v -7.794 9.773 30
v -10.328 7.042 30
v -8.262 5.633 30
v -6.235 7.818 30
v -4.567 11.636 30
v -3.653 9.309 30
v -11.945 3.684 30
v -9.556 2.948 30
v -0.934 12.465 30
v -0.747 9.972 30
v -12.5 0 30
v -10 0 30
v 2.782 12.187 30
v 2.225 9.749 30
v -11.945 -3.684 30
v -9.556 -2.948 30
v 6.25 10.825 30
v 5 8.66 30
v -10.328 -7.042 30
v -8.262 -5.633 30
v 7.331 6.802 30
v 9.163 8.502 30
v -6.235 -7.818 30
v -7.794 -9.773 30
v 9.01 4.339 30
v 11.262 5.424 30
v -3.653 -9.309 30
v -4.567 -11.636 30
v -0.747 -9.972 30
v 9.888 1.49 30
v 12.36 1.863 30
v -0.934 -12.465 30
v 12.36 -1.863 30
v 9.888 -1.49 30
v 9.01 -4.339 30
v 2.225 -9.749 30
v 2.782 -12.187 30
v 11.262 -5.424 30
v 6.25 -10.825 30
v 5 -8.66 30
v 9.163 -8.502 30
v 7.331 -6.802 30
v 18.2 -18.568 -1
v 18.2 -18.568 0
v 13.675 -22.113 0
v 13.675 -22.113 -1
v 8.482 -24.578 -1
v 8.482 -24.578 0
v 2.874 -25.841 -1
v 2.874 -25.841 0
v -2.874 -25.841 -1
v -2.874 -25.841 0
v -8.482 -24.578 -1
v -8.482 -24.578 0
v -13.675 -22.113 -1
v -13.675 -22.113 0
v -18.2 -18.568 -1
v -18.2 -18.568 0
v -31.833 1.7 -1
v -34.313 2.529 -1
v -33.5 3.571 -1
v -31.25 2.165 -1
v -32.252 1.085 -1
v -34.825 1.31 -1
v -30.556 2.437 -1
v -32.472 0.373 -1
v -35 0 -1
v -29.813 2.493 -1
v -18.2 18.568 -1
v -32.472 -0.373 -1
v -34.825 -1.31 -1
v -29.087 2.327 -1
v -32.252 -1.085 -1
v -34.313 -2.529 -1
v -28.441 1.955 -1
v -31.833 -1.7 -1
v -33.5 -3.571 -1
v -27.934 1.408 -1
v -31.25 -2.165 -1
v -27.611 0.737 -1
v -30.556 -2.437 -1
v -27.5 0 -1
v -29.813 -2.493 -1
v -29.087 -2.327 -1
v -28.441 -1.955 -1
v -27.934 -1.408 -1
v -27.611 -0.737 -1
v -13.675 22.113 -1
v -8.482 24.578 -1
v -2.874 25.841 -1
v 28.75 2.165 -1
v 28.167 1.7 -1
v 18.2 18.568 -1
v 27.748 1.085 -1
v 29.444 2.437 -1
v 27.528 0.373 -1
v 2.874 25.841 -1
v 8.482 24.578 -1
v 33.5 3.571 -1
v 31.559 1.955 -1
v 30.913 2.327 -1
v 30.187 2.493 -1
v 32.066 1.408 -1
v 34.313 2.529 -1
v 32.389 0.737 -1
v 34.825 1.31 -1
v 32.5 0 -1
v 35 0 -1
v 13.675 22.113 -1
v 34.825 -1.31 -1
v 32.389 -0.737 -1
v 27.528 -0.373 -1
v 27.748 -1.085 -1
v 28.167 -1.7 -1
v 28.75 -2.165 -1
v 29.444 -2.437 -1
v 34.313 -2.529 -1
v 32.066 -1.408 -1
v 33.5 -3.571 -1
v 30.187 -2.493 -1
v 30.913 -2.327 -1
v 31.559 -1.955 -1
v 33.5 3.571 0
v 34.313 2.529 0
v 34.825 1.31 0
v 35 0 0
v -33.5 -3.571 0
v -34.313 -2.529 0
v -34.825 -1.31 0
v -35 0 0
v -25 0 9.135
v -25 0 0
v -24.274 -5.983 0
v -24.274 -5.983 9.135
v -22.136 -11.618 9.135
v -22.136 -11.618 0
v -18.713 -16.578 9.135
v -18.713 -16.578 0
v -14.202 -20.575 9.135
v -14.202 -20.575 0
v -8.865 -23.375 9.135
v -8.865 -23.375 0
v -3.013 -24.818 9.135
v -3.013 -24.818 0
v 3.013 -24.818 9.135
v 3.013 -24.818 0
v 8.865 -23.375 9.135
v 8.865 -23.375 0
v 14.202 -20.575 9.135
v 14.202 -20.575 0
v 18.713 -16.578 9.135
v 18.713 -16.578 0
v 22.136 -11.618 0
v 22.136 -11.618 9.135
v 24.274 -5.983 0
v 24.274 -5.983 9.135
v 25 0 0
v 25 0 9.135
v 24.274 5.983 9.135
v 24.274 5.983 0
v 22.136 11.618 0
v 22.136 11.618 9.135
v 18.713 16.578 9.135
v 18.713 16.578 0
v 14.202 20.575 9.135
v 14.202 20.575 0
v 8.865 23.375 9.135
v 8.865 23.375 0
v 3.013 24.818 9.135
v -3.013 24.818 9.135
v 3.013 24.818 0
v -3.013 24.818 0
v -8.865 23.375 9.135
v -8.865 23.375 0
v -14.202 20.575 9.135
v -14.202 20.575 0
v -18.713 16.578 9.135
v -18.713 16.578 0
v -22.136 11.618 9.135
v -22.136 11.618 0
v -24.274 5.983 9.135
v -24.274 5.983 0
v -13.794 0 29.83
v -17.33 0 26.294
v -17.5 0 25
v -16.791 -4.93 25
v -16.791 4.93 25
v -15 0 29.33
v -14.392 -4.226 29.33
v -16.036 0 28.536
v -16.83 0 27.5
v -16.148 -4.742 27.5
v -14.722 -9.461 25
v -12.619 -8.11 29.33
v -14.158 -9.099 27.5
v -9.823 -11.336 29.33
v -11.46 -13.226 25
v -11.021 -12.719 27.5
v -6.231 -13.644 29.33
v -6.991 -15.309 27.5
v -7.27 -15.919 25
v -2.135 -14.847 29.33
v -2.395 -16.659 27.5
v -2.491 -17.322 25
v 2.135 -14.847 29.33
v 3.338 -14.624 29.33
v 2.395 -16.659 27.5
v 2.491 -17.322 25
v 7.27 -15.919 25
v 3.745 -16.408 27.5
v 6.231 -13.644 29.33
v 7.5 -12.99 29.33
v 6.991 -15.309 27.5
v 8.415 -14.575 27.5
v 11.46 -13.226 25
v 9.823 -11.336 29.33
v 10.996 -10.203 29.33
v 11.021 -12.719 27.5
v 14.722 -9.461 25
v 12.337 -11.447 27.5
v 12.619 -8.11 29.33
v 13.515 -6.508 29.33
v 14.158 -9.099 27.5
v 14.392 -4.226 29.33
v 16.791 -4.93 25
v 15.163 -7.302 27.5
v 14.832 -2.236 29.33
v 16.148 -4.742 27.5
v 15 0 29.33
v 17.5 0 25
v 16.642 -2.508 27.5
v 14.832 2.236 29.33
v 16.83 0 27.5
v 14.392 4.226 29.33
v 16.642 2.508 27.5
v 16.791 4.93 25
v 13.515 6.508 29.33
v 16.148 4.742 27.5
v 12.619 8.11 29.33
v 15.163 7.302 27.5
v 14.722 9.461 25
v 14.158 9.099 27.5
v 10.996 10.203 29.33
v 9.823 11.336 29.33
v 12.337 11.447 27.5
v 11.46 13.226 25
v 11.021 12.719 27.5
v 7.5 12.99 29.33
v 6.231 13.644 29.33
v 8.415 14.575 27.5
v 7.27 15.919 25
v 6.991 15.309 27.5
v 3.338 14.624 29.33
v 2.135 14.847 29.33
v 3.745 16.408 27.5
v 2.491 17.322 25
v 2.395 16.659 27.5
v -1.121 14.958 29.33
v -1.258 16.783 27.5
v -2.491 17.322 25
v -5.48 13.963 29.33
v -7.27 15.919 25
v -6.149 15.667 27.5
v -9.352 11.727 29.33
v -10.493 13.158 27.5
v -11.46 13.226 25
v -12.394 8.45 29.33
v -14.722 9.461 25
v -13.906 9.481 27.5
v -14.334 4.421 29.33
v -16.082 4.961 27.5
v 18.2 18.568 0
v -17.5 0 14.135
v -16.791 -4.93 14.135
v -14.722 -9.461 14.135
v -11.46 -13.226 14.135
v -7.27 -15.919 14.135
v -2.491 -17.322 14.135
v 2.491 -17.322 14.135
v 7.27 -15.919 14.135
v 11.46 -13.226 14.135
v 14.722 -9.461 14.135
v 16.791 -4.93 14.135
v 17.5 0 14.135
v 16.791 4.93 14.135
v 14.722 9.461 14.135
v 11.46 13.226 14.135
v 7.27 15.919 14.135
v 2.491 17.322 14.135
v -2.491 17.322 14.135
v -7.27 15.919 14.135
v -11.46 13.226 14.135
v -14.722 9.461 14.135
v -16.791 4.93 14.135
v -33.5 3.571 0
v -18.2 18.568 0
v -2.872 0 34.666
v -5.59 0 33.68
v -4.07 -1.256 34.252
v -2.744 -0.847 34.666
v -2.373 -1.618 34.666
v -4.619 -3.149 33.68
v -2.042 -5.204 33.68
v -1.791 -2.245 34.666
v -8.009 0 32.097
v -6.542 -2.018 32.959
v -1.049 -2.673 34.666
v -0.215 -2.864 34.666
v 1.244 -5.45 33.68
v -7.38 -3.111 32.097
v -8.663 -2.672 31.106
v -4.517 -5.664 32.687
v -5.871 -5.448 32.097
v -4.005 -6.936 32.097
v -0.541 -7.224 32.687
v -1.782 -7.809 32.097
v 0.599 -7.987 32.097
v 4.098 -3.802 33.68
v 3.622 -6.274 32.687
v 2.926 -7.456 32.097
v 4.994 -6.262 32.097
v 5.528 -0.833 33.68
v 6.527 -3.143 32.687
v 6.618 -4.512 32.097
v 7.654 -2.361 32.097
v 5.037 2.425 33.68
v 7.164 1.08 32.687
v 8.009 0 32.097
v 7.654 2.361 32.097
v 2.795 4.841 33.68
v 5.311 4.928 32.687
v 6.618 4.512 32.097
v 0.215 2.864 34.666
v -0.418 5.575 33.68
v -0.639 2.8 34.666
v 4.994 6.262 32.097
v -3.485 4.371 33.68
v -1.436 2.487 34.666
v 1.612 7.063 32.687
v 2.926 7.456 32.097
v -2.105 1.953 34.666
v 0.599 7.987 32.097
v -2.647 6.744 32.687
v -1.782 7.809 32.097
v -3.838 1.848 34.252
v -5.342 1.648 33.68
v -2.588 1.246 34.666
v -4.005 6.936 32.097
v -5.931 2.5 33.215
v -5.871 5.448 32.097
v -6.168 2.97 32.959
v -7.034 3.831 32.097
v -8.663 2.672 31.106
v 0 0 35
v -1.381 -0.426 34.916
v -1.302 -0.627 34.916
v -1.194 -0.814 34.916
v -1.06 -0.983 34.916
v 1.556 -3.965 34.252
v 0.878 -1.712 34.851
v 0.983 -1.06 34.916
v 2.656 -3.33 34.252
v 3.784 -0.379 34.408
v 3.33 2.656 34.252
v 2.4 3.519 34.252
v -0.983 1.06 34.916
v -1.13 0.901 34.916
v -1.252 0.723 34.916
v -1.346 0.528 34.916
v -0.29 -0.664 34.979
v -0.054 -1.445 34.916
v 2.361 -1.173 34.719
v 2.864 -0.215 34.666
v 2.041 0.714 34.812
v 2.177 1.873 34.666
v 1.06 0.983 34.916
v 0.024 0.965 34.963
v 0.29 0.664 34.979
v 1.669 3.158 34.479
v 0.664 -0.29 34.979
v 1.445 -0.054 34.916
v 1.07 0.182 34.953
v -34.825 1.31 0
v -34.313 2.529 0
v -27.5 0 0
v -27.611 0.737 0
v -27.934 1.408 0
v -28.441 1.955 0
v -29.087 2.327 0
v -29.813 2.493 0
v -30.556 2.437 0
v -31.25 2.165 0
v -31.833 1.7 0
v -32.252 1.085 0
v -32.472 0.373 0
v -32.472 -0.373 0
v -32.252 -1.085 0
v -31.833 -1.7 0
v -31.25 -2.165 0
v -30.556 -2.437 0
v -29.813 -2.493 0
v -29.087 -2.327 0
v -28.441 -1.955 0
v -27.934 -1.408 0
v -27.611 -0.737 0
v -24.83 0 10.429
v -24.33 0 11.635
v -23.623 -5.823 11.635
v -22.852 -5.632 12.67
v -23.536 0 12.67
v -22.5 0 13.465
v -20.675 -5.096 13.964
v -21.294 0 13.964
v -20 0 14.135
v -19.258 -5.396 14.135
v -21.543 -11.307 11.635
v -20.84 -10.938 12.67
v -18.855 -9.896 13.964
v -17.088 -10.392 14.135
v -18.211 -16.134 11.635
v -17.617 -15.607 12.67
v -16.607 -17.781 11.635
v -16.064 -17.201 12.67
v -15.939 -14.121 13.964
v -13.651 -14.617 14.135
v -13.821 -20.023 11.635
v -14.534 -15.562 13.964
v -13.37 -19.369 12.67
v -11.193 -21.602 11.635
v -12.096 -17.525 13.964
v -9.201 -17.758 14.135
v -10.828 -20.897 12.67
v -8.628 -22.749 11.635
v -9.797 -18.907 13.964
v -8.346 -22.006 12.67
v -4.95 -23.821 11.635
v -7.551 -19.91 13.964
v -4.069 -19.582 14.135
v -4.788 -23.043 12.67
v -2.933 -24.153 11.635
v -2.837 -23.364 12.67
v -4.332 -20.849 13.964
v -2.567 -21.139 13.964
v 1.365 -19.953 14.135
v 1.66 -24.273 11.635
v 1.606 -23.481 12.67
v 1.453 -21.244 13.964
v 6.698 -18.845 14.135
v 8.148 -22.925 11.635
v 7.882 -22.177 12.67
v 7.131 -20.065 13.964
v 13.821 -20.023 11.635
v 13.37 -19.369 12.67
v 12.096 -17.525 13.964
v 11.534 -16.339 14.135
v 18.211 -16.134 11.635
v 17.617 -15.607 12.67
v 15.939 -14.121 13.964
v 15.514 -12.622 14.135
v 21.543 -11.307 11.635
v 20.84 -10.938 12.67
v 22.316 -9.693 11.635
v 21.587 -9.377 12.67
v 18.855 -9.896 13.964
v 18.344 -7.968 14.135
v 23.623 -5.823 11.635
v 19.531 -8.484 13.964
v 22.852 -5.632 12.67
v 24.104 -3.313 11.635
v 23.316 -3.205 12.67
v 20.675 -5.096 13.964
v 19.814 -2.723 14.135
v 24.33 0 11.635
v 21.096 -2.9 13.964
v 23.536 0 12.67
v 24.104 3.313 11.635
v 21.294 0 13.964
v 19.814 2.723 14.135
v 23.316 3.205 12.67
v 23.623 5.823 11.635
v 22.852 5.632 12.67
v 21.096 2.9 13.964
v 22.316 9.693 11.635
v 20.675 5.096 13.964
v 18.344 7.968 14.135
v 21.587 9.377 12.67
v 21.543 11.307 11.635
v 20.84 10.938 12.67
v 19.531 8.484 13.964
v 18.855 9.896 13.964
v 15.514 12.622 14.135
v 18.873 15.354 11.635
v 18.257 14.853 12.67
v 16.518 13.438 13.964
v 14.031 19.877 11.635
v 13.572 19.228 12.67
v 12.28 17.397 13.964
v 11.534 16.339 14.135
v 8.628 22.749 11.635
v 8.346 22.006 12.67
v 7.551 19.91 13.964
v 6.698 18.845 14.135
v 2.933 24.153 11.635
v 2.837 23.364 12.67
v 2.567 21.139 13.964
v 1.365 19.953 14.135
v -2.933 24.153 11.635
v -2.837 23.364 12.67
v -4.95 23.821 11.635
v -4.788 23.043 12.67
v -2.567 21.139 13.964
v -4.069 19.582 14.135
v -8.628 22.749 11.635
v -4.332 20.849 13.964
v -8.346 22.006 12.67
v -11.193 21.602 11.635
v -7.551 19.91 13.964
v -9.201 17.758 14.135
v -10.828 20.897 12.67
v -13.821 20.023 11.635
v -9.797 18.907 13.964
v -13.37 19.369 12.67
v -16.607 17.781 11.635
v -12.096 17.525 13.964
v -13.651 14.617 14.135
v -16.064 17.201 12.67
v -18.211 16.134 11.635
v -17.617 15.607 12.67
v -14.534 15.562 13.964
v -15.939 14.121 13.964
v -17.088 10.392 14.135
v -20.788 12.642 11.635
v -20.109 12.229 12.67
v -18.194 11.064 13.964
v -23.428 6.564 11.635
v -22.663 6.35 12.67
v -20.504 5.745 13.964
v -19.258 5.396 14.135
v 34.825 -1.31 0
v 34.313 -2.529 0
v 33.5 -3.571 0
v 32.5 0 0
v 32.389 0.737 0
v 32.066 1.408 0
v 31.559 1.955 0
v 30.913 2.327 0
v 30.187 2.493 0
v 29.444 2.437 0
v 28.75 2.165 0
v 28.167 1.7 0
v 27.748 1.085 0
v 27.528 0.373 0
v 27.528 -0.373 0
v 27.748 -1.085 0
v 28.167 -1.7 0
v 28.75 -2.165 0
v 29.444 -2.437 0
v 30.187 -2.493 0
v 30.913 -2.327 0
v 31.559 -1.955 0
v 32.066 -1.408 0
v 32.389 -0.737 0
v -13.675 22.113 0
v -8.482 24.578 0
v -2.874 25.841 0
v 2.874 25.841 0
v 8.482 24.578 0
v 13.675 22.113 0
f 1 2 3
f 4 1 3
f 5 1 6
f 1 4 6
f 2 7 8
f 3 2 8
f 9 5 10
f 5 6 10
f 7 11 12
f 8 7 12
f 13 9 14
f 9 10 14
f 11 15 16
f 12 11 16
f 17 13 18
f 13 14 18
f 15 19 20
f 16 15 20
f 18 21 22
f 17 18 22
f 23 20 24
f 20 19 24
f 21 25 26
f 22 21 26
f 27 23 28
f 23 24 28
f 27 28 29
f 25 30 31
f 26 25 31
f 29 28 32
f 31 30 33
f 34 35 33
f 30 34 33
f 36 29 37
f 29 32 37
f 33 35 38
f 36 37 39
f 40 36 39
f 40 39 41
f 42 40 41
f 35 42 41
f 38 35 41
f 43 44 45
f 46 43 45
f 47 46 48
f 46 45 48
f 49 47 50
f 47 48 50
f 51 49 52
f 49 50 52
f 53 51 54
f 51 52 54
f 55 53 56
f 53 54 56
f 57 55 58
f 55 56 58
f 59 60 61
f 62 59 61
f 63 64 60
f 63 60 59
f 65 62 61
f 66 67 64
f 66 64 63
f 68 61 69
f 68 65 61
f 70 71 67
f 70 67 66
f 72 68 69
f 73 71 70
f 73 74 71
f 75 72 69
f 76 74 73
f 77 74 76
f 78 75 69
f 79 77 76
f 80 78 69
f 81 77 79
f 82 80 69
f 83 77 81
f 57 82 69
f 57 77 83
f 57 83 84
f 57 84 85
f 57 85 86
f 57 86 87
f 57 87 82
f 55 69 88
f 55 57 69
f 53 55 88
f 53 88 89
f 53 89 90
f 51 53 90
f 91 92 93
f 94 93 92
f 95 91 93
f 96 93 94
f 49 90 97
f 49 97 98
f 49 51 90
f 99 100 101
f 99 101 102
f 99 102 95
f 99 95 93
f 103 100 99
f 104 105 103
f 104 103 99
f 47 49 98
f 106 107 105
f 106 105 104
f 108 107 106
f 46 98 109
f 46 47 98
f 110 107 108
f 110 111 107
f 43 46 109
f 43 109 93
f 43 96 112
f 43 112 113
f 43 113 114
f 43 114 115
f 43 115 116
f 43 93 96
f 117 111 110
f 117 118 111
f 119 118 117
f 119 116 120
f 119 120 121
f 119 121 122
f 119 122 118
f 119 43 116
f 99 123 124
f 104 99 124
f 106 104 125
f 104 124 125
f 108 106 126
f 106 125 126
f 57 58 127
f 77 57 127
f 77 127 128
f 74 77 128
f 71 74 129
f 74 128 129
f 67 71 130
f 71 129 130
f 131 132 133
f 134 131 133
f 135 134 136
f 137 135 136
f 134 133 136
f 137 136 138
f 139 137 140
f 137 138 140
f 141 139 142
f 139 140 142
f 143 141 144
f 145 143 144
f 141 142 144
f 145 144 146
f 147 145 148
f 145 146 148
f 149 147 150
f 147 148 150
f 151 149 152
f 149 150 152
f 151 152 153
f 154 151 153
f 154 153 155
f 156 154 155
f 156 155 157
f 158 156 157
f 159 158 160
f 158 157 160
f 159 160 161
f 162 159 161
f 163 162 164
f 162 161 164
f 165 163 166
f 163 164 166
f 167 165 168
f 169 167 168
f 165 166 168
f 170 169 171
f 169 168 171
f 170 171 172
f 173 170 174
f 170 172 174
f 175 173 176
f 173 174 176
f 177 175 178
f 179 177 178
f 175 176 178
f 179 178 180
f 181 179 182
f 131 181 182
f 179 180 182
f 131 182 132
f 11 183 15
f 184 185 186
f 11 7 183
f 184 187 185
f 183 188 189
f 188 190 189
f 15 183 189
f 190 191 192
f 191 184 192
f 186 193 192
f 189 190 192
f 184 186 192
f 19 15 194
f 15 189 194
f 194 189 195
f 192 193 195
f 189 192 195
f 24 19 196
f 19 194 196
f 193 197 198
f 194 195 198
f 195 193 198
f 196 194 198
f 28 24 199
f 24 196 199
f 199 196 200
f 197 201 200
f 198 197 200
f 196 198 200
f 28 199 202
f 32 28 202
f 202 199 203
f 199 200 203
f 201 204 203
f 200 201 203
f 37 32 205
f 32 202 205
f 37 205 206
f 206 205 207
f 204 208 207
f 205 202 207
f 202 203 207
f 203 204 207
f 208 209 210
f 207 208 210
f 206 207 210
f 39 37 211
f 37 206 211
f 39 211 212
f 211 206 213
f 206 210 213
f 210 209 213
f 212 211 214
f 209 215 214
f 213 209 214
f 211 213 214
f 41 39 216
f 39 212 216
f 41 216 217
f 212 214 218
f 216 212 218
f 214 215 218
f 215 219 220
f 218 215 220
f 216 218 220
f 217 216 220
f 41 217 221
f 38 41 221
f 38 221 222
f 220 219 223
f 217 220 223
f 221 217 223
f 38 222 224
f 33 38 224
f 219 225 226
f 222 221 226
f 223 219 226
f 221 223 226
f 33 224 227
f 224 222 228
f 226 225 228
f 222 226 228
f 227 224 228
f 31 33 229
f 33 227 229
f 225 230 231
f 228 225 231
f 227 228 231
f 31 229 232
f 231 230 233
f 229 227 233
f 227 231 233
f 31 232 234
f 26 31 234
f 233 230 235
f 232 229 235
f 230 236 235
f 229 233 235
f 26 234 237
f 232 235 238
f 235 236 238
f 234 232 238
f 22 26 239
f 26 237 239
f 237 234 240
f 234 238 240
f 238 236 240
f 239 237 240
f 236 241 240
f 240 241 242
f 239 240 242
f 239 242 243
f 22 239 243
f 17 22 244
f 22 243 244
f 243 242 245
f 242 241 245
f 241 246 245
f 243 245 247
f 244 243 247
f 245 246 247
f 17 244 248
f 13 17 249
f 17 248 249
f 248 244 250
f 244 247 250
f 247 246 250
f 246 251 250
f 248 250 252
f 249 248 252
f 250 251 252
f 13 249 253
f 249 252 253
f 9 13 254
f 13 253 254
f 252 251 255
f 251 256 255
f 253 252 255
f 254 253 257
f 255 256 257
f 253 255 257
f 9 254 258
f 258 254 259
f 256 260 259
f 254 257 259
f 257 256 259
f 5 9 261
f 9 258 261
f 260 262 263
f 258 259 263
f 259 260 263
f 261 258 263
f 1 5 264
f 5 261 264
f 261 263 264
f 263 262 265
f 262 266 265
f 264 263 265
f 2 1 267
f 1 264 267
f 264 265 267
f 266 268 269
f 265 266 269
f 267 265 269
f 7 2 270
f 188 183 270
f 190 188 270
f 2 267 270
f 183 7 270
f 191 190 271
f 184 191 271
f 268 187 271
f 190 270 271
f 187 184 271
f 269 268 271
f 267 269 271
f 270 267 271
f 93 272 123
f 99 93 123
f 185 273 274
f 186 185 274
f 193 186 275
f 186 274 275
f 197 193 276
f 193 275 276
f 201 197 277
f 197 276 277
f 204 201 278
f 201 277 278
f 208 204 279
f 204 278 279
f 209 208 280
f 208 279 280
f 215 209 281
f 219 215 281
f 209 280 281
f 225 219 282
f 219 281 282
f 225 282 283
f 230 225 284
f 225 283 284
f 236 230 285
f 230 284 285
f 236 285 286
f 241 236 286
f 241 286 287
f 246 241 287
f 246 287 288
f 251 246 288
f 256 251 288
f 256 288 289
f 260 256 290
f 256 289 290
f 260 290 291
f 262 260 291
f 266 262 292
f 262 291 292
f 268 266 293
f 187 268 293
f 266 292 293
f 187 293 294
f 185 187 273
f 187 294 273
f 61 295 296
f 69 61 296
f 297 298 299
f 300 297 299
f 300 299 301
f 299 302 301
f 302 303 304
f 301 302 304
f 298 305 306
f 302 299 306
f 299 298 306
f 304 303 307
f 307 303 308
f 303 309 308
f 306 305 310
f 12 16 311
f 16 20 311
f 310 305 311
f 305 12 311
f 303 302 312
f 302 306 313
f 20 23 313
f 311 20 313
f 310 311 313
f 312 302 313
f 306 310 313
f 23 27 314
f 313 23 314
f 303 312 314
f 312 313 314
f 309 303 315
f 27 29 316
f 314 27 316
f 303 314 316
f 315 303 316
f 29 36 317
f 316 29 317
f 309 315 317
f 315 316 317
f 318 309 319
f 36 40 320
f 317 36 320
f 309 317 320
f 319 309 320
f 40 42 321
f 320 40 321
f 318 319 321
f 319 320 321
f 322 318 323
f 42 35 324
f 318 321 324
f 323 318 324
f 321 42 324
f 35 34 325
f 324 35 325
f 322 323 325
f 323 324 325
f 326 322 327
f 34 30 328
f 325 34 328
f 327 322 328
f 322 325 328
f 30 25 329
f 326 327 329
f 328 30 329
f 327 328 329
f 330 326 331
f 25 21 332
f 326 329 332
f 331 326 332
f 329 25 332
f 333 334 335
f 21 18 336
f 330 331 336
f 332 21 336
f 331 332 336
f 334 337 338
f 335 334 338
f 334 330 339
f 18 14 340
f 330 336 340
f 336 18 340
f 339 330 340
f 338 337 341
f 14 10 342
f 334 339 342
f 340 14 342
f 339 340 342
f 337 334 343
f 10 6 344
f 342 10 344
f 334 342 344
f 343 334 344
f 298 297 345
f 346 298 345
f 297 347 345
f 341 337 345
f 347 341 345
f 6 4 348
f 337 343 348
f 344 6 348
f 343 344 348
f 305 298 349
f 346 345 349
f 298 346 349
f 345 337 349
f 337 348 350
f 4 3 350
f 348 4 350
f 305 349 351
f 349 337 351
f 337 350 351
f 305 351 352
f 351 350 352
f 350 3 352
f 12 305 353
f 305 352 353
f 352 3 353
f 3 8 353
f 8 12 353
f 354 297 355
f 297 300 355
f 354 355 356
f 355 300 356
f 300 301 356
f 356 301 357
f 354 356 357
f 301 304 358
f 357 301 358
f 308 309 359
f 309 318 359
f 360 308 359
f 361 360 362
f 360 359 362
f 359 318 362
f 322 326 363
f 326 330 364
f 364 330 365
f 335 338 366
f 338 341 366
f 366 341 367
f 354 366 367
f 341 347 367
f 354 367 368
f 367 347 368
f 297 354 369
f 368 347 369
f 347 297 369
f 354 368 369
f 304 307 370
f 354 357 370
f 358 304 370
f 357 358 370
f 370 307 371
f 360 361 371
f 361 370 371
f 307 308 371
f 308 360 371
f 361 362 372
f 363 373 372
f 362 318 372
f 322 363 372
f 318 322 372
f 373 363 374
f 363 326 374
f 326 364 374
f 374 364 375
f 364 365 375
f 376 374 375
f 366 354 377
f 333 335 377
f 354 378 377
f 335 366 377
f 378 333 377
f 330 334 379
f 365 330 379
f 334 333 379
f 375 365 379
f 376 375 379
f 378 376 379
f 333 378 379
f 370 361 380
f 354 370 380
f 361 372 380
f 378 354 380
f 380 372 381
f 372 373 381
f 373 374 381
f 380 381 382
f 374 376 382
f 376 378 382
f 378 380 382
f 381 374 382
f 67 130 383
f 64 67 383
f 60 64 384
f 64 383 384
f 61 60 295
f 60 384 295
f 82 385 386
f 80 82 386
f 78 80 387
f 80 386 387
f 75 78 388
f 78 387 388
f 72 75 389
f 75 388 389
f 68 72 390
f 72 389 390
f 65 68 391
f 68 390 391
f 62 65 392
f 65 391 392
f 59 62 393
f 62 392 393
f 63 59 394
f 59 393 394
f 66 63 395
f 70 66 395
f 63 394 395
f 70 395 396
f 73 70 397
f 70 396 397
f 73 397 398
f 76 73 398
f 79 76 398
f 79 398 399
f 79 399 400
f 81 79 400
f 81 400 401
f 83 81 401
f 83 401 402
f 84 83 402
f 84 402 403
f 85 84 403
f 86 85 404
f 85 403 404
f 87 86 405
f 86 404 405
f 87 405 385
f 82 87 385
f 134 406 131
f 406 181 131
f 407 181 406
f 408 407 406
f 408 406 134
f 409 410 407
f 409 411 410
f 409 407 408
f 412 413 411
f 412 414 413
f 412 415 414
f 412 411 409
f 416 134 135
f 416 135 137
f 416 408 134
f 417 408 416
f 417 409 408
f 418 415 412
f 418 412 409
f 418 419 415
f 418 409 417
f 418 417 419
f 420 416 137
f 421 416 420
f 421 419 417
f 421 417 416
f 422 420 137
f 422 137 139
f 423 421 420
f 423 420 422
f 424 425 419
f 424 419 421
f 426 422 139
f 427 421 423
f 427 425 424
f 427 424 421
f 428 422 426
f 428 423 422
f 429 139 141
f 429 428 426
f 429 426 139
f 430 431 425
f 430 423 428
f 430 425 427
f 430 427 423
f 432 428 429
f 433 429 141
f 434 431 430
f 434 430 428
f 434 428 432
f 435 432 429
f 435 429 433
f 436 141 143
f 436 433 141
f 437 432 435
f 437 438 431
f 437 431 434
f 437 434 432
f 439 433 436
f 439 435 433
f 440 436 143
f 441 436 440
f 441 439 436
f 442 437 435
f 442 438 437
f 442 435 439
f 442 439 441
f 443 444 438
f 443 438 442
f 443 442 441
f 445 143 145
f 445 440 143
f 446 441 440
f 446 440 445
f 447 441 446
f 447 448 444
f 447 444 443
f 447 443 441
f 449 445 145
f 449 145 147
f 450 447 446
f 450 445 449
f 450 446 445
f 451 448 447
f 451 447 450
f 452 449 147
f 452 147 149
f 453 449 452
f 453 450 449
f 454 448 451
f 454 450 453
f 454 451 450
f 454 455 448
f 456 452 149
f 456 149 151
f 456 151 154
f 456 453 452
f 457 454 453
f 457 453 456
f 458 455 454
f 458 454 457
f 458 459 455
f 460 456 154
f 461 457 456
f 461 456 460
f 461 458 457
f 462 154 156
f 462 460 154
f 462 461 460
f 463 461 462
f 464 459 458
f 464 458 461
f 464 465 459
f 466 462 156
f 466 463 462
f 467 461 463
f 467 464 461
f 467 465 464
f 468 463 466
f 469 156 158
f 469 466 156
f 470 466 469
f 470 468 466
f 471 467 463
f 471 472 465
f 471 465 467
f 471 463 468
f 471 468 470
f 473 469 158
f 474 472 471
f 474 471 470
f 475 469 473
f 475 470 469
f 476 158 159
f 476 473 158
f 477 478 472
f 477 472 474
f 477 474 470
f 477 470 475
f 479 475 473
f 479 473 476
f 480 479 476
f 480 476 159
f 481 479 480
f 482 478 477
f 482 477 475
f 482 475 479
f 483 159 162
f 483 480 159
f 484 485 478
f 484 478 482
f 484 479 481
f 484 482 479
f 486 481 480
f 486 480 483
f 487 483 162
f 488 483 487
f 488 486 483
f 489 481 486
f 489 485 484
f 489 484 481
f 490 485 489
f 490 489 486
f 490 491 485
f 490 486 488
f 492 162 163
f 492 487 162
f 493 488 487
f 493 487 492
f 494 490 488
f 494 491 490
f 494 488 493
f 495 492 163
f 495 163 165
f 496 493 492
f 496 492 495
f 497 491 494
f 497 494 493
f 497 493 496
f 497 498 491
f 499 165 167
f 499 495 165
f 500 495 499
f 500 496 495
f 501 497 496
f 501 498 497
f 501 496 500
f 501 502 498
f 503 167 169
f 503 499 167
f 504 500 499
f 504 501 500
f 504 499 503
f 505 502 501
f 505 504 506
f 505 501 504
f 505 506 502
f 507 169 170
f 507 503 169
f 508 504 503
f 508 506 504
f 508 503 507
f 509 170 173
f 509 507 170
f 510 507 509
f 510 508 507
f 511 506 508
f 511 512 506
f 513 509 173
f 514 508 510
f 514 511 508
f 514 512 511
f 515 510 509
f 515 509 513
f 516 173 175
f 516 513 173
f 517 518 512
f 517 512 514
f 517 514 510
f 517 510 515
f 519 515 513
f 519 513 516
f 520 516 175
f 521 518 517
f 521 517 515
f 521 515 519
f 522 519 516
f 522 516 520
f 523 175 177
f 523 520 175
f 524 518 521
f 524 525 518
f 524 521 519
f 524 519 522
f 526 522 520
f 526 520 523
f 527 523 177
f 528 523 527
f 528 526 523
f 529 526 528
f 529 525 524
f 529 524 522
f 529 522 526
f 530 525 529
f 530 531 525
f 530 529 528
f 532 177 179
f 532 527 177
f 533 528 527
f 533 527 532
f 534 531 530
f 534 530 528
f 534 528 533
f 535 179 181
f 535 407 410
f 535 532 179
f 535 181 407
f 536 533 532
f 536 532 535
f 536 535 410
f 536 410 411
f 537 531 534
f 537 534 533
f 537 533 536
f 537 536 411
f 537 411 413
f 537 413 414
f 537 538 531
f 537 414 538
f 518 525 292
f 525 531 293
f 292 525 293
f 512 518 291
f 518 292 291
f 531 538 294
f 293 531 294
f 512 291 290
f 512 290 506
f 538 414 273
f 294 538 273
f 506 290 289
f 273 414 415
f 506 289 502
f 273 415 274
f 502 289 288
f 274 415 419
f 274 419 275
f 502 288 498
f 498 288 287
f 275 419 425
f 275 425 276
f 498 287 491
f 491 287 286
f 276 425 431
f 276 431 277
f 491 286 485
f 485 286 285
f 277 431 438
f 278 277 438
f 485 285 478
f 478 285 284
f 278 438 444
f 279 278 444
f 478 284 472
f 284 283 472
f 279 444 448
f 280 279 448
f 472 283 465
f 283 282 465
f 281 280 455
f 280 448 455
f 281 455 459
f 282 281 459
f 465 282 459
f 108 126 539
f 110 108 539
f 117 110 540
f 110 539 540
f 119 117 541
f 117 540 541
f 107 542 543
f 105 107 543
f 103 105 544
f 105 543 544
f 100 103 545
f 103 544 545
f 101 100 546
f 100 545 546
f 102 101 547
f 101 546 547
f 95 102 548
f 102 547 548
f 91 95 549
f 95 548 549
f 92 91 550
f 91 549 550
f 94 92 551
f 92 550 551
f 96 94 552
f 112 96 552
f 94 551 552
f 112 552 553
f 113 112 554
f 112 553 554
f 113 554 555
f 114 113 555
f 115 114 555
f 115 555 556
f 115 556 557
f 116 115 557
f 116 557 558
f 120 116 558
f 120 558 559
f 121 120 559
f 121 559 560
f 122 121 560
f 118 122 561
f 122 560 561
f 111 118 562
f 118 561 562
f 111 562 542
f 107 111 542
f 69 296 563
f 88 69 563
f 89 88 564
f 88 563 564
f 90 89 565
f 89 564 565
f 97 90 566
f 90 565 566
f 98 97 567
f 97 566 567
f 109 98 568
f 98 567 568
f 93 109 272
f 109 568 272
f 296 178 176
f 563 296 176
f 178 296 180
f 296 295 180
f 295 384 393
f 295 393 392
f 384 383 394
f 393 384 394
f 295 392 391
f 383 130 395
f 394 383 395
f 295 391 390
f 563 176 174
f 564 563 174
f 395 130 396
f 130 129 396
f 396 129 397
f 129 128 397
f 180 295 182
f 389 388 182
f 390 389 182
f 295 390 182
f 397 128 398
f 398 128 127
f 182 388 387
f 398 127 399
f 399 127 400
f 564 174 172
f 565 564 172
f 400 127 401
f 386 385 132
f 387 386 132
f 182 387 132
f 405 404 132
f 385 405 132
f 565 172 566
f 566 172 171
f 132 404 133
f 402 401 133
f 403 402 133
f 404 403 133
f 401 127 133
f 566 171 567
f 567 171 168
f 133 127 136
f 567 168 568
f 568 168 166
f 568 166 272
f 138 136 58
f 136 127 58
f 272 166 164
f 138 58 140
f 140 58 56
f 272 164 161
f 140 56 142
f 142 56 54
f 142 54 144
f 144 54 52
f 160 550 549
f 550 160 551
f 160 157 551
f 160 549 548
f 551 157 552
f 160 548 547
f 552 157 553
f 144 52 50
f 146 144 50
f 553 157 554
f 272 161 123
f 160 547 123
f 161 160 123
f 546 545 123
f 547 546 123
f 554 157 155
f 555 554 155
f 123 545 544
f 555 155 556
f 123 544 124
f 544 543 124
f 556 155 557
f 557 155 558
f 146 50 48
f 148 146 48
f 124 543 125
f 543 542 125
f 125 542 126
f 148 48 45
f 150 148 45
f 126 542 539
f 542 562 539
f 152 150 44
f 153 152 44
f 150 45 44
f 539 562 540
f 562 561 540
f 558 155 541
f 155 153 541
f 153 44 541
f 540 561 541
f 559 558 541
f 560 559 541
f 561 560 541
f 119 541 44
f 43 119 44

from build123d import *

# Parameters (mm, degrees)
F2_R     = 5
F4_DEPTH = 1


with BuildPart() as f1:
    # F0 (on Front) → F1 (revolve)
    with BuildSketch(Plane.XZ):
        with BuildLine():
            Line((-25, 14.134617), (-25, 0))
            Line((-25, 0), (0, 0))
            Line((0, 0), (0, 35))
            ThreePointArc((0, 35), (-5.59017, 33.68034), (-10, 30))
            Line((-10, 30), (-17.5, 30))
            Line((-17.5, 30), (-17.5, 14.134617))
            Line((-17.5, 14.134617), (-25, 14.134617))
        make_face()
    revolve(axis=Axis((0, 0, 17.5), (0, 0, 1)))

    # F2
    f2_edges = [f1.edges().sort_by_distance(p)[0] for p in [
        (17.5, 0, 30),
        (25, 0, 14.134617),
    ]]
    fillet(f2_edges, radius=F2_R)

    # F3 (on face) → F4 (join)
    with BuildSketch(Plane(origin=(0, 0, 0), x_dir=(1, 0, 0), z_dir=(0, 0, -1))):
        with BuildLine():
            ThreePointArc((27.5, 0), (30, 2.5), (32.5, 0))
            Line((32.5, 0), (35, 0))
            ThreePointArc((35, 0), (34.609772, 1.936492), (33.5, 3.570714))
            Line((33.5, 3.570714), (18.2, 18.567714))
            ThreePointArc((18.2, 18.567714), (0, 26), (-18.2, 18.567714))
            Line((-18.2, 18.567714), (-33.5, 3.570714))
            ThreePointArc((-33.5, 3.570714), (-34.609772, 1.936492), (-35, 0))
            Line((-35, 0), (-32.5, 0))
            ThreePointArc((-32.5, 0), (-30, 2.5), (-27.5, 0))
            Line((-27.5, 0), (27.5, 0))
        make_face()
        with BuildLine():
            Line((35, 0), (32.5, 0))
            ThreePointArc((32.5, 0), (30, -2.5), (27.5, 0))
            Line((27.5, 0), (-27.5, 0))
            ThreePointArc((-27.5, 0), (-30, -2.5), (-32.5, 0))
            Line((-32.5, 0), (-35, 0))
            ThreePointArc((-35, 0), (-34.609772, -1.936492), (-33.5, -3.570714))
            Line((-33.5, -3.570714), (-18.2, -18.567714))
            ThreePointArc((-18.2, -18.567714), (0, -26), (18.2, -18.567714))
            Line((18.2, -18.567714), (33.5, -3.570714))
            ThreePointArc((33.5, -3.570714), (34.609772, -1.936492), (35, 0))
        make_face()
    extrude(amount=F4_DEPTH)


solid = f1.part
